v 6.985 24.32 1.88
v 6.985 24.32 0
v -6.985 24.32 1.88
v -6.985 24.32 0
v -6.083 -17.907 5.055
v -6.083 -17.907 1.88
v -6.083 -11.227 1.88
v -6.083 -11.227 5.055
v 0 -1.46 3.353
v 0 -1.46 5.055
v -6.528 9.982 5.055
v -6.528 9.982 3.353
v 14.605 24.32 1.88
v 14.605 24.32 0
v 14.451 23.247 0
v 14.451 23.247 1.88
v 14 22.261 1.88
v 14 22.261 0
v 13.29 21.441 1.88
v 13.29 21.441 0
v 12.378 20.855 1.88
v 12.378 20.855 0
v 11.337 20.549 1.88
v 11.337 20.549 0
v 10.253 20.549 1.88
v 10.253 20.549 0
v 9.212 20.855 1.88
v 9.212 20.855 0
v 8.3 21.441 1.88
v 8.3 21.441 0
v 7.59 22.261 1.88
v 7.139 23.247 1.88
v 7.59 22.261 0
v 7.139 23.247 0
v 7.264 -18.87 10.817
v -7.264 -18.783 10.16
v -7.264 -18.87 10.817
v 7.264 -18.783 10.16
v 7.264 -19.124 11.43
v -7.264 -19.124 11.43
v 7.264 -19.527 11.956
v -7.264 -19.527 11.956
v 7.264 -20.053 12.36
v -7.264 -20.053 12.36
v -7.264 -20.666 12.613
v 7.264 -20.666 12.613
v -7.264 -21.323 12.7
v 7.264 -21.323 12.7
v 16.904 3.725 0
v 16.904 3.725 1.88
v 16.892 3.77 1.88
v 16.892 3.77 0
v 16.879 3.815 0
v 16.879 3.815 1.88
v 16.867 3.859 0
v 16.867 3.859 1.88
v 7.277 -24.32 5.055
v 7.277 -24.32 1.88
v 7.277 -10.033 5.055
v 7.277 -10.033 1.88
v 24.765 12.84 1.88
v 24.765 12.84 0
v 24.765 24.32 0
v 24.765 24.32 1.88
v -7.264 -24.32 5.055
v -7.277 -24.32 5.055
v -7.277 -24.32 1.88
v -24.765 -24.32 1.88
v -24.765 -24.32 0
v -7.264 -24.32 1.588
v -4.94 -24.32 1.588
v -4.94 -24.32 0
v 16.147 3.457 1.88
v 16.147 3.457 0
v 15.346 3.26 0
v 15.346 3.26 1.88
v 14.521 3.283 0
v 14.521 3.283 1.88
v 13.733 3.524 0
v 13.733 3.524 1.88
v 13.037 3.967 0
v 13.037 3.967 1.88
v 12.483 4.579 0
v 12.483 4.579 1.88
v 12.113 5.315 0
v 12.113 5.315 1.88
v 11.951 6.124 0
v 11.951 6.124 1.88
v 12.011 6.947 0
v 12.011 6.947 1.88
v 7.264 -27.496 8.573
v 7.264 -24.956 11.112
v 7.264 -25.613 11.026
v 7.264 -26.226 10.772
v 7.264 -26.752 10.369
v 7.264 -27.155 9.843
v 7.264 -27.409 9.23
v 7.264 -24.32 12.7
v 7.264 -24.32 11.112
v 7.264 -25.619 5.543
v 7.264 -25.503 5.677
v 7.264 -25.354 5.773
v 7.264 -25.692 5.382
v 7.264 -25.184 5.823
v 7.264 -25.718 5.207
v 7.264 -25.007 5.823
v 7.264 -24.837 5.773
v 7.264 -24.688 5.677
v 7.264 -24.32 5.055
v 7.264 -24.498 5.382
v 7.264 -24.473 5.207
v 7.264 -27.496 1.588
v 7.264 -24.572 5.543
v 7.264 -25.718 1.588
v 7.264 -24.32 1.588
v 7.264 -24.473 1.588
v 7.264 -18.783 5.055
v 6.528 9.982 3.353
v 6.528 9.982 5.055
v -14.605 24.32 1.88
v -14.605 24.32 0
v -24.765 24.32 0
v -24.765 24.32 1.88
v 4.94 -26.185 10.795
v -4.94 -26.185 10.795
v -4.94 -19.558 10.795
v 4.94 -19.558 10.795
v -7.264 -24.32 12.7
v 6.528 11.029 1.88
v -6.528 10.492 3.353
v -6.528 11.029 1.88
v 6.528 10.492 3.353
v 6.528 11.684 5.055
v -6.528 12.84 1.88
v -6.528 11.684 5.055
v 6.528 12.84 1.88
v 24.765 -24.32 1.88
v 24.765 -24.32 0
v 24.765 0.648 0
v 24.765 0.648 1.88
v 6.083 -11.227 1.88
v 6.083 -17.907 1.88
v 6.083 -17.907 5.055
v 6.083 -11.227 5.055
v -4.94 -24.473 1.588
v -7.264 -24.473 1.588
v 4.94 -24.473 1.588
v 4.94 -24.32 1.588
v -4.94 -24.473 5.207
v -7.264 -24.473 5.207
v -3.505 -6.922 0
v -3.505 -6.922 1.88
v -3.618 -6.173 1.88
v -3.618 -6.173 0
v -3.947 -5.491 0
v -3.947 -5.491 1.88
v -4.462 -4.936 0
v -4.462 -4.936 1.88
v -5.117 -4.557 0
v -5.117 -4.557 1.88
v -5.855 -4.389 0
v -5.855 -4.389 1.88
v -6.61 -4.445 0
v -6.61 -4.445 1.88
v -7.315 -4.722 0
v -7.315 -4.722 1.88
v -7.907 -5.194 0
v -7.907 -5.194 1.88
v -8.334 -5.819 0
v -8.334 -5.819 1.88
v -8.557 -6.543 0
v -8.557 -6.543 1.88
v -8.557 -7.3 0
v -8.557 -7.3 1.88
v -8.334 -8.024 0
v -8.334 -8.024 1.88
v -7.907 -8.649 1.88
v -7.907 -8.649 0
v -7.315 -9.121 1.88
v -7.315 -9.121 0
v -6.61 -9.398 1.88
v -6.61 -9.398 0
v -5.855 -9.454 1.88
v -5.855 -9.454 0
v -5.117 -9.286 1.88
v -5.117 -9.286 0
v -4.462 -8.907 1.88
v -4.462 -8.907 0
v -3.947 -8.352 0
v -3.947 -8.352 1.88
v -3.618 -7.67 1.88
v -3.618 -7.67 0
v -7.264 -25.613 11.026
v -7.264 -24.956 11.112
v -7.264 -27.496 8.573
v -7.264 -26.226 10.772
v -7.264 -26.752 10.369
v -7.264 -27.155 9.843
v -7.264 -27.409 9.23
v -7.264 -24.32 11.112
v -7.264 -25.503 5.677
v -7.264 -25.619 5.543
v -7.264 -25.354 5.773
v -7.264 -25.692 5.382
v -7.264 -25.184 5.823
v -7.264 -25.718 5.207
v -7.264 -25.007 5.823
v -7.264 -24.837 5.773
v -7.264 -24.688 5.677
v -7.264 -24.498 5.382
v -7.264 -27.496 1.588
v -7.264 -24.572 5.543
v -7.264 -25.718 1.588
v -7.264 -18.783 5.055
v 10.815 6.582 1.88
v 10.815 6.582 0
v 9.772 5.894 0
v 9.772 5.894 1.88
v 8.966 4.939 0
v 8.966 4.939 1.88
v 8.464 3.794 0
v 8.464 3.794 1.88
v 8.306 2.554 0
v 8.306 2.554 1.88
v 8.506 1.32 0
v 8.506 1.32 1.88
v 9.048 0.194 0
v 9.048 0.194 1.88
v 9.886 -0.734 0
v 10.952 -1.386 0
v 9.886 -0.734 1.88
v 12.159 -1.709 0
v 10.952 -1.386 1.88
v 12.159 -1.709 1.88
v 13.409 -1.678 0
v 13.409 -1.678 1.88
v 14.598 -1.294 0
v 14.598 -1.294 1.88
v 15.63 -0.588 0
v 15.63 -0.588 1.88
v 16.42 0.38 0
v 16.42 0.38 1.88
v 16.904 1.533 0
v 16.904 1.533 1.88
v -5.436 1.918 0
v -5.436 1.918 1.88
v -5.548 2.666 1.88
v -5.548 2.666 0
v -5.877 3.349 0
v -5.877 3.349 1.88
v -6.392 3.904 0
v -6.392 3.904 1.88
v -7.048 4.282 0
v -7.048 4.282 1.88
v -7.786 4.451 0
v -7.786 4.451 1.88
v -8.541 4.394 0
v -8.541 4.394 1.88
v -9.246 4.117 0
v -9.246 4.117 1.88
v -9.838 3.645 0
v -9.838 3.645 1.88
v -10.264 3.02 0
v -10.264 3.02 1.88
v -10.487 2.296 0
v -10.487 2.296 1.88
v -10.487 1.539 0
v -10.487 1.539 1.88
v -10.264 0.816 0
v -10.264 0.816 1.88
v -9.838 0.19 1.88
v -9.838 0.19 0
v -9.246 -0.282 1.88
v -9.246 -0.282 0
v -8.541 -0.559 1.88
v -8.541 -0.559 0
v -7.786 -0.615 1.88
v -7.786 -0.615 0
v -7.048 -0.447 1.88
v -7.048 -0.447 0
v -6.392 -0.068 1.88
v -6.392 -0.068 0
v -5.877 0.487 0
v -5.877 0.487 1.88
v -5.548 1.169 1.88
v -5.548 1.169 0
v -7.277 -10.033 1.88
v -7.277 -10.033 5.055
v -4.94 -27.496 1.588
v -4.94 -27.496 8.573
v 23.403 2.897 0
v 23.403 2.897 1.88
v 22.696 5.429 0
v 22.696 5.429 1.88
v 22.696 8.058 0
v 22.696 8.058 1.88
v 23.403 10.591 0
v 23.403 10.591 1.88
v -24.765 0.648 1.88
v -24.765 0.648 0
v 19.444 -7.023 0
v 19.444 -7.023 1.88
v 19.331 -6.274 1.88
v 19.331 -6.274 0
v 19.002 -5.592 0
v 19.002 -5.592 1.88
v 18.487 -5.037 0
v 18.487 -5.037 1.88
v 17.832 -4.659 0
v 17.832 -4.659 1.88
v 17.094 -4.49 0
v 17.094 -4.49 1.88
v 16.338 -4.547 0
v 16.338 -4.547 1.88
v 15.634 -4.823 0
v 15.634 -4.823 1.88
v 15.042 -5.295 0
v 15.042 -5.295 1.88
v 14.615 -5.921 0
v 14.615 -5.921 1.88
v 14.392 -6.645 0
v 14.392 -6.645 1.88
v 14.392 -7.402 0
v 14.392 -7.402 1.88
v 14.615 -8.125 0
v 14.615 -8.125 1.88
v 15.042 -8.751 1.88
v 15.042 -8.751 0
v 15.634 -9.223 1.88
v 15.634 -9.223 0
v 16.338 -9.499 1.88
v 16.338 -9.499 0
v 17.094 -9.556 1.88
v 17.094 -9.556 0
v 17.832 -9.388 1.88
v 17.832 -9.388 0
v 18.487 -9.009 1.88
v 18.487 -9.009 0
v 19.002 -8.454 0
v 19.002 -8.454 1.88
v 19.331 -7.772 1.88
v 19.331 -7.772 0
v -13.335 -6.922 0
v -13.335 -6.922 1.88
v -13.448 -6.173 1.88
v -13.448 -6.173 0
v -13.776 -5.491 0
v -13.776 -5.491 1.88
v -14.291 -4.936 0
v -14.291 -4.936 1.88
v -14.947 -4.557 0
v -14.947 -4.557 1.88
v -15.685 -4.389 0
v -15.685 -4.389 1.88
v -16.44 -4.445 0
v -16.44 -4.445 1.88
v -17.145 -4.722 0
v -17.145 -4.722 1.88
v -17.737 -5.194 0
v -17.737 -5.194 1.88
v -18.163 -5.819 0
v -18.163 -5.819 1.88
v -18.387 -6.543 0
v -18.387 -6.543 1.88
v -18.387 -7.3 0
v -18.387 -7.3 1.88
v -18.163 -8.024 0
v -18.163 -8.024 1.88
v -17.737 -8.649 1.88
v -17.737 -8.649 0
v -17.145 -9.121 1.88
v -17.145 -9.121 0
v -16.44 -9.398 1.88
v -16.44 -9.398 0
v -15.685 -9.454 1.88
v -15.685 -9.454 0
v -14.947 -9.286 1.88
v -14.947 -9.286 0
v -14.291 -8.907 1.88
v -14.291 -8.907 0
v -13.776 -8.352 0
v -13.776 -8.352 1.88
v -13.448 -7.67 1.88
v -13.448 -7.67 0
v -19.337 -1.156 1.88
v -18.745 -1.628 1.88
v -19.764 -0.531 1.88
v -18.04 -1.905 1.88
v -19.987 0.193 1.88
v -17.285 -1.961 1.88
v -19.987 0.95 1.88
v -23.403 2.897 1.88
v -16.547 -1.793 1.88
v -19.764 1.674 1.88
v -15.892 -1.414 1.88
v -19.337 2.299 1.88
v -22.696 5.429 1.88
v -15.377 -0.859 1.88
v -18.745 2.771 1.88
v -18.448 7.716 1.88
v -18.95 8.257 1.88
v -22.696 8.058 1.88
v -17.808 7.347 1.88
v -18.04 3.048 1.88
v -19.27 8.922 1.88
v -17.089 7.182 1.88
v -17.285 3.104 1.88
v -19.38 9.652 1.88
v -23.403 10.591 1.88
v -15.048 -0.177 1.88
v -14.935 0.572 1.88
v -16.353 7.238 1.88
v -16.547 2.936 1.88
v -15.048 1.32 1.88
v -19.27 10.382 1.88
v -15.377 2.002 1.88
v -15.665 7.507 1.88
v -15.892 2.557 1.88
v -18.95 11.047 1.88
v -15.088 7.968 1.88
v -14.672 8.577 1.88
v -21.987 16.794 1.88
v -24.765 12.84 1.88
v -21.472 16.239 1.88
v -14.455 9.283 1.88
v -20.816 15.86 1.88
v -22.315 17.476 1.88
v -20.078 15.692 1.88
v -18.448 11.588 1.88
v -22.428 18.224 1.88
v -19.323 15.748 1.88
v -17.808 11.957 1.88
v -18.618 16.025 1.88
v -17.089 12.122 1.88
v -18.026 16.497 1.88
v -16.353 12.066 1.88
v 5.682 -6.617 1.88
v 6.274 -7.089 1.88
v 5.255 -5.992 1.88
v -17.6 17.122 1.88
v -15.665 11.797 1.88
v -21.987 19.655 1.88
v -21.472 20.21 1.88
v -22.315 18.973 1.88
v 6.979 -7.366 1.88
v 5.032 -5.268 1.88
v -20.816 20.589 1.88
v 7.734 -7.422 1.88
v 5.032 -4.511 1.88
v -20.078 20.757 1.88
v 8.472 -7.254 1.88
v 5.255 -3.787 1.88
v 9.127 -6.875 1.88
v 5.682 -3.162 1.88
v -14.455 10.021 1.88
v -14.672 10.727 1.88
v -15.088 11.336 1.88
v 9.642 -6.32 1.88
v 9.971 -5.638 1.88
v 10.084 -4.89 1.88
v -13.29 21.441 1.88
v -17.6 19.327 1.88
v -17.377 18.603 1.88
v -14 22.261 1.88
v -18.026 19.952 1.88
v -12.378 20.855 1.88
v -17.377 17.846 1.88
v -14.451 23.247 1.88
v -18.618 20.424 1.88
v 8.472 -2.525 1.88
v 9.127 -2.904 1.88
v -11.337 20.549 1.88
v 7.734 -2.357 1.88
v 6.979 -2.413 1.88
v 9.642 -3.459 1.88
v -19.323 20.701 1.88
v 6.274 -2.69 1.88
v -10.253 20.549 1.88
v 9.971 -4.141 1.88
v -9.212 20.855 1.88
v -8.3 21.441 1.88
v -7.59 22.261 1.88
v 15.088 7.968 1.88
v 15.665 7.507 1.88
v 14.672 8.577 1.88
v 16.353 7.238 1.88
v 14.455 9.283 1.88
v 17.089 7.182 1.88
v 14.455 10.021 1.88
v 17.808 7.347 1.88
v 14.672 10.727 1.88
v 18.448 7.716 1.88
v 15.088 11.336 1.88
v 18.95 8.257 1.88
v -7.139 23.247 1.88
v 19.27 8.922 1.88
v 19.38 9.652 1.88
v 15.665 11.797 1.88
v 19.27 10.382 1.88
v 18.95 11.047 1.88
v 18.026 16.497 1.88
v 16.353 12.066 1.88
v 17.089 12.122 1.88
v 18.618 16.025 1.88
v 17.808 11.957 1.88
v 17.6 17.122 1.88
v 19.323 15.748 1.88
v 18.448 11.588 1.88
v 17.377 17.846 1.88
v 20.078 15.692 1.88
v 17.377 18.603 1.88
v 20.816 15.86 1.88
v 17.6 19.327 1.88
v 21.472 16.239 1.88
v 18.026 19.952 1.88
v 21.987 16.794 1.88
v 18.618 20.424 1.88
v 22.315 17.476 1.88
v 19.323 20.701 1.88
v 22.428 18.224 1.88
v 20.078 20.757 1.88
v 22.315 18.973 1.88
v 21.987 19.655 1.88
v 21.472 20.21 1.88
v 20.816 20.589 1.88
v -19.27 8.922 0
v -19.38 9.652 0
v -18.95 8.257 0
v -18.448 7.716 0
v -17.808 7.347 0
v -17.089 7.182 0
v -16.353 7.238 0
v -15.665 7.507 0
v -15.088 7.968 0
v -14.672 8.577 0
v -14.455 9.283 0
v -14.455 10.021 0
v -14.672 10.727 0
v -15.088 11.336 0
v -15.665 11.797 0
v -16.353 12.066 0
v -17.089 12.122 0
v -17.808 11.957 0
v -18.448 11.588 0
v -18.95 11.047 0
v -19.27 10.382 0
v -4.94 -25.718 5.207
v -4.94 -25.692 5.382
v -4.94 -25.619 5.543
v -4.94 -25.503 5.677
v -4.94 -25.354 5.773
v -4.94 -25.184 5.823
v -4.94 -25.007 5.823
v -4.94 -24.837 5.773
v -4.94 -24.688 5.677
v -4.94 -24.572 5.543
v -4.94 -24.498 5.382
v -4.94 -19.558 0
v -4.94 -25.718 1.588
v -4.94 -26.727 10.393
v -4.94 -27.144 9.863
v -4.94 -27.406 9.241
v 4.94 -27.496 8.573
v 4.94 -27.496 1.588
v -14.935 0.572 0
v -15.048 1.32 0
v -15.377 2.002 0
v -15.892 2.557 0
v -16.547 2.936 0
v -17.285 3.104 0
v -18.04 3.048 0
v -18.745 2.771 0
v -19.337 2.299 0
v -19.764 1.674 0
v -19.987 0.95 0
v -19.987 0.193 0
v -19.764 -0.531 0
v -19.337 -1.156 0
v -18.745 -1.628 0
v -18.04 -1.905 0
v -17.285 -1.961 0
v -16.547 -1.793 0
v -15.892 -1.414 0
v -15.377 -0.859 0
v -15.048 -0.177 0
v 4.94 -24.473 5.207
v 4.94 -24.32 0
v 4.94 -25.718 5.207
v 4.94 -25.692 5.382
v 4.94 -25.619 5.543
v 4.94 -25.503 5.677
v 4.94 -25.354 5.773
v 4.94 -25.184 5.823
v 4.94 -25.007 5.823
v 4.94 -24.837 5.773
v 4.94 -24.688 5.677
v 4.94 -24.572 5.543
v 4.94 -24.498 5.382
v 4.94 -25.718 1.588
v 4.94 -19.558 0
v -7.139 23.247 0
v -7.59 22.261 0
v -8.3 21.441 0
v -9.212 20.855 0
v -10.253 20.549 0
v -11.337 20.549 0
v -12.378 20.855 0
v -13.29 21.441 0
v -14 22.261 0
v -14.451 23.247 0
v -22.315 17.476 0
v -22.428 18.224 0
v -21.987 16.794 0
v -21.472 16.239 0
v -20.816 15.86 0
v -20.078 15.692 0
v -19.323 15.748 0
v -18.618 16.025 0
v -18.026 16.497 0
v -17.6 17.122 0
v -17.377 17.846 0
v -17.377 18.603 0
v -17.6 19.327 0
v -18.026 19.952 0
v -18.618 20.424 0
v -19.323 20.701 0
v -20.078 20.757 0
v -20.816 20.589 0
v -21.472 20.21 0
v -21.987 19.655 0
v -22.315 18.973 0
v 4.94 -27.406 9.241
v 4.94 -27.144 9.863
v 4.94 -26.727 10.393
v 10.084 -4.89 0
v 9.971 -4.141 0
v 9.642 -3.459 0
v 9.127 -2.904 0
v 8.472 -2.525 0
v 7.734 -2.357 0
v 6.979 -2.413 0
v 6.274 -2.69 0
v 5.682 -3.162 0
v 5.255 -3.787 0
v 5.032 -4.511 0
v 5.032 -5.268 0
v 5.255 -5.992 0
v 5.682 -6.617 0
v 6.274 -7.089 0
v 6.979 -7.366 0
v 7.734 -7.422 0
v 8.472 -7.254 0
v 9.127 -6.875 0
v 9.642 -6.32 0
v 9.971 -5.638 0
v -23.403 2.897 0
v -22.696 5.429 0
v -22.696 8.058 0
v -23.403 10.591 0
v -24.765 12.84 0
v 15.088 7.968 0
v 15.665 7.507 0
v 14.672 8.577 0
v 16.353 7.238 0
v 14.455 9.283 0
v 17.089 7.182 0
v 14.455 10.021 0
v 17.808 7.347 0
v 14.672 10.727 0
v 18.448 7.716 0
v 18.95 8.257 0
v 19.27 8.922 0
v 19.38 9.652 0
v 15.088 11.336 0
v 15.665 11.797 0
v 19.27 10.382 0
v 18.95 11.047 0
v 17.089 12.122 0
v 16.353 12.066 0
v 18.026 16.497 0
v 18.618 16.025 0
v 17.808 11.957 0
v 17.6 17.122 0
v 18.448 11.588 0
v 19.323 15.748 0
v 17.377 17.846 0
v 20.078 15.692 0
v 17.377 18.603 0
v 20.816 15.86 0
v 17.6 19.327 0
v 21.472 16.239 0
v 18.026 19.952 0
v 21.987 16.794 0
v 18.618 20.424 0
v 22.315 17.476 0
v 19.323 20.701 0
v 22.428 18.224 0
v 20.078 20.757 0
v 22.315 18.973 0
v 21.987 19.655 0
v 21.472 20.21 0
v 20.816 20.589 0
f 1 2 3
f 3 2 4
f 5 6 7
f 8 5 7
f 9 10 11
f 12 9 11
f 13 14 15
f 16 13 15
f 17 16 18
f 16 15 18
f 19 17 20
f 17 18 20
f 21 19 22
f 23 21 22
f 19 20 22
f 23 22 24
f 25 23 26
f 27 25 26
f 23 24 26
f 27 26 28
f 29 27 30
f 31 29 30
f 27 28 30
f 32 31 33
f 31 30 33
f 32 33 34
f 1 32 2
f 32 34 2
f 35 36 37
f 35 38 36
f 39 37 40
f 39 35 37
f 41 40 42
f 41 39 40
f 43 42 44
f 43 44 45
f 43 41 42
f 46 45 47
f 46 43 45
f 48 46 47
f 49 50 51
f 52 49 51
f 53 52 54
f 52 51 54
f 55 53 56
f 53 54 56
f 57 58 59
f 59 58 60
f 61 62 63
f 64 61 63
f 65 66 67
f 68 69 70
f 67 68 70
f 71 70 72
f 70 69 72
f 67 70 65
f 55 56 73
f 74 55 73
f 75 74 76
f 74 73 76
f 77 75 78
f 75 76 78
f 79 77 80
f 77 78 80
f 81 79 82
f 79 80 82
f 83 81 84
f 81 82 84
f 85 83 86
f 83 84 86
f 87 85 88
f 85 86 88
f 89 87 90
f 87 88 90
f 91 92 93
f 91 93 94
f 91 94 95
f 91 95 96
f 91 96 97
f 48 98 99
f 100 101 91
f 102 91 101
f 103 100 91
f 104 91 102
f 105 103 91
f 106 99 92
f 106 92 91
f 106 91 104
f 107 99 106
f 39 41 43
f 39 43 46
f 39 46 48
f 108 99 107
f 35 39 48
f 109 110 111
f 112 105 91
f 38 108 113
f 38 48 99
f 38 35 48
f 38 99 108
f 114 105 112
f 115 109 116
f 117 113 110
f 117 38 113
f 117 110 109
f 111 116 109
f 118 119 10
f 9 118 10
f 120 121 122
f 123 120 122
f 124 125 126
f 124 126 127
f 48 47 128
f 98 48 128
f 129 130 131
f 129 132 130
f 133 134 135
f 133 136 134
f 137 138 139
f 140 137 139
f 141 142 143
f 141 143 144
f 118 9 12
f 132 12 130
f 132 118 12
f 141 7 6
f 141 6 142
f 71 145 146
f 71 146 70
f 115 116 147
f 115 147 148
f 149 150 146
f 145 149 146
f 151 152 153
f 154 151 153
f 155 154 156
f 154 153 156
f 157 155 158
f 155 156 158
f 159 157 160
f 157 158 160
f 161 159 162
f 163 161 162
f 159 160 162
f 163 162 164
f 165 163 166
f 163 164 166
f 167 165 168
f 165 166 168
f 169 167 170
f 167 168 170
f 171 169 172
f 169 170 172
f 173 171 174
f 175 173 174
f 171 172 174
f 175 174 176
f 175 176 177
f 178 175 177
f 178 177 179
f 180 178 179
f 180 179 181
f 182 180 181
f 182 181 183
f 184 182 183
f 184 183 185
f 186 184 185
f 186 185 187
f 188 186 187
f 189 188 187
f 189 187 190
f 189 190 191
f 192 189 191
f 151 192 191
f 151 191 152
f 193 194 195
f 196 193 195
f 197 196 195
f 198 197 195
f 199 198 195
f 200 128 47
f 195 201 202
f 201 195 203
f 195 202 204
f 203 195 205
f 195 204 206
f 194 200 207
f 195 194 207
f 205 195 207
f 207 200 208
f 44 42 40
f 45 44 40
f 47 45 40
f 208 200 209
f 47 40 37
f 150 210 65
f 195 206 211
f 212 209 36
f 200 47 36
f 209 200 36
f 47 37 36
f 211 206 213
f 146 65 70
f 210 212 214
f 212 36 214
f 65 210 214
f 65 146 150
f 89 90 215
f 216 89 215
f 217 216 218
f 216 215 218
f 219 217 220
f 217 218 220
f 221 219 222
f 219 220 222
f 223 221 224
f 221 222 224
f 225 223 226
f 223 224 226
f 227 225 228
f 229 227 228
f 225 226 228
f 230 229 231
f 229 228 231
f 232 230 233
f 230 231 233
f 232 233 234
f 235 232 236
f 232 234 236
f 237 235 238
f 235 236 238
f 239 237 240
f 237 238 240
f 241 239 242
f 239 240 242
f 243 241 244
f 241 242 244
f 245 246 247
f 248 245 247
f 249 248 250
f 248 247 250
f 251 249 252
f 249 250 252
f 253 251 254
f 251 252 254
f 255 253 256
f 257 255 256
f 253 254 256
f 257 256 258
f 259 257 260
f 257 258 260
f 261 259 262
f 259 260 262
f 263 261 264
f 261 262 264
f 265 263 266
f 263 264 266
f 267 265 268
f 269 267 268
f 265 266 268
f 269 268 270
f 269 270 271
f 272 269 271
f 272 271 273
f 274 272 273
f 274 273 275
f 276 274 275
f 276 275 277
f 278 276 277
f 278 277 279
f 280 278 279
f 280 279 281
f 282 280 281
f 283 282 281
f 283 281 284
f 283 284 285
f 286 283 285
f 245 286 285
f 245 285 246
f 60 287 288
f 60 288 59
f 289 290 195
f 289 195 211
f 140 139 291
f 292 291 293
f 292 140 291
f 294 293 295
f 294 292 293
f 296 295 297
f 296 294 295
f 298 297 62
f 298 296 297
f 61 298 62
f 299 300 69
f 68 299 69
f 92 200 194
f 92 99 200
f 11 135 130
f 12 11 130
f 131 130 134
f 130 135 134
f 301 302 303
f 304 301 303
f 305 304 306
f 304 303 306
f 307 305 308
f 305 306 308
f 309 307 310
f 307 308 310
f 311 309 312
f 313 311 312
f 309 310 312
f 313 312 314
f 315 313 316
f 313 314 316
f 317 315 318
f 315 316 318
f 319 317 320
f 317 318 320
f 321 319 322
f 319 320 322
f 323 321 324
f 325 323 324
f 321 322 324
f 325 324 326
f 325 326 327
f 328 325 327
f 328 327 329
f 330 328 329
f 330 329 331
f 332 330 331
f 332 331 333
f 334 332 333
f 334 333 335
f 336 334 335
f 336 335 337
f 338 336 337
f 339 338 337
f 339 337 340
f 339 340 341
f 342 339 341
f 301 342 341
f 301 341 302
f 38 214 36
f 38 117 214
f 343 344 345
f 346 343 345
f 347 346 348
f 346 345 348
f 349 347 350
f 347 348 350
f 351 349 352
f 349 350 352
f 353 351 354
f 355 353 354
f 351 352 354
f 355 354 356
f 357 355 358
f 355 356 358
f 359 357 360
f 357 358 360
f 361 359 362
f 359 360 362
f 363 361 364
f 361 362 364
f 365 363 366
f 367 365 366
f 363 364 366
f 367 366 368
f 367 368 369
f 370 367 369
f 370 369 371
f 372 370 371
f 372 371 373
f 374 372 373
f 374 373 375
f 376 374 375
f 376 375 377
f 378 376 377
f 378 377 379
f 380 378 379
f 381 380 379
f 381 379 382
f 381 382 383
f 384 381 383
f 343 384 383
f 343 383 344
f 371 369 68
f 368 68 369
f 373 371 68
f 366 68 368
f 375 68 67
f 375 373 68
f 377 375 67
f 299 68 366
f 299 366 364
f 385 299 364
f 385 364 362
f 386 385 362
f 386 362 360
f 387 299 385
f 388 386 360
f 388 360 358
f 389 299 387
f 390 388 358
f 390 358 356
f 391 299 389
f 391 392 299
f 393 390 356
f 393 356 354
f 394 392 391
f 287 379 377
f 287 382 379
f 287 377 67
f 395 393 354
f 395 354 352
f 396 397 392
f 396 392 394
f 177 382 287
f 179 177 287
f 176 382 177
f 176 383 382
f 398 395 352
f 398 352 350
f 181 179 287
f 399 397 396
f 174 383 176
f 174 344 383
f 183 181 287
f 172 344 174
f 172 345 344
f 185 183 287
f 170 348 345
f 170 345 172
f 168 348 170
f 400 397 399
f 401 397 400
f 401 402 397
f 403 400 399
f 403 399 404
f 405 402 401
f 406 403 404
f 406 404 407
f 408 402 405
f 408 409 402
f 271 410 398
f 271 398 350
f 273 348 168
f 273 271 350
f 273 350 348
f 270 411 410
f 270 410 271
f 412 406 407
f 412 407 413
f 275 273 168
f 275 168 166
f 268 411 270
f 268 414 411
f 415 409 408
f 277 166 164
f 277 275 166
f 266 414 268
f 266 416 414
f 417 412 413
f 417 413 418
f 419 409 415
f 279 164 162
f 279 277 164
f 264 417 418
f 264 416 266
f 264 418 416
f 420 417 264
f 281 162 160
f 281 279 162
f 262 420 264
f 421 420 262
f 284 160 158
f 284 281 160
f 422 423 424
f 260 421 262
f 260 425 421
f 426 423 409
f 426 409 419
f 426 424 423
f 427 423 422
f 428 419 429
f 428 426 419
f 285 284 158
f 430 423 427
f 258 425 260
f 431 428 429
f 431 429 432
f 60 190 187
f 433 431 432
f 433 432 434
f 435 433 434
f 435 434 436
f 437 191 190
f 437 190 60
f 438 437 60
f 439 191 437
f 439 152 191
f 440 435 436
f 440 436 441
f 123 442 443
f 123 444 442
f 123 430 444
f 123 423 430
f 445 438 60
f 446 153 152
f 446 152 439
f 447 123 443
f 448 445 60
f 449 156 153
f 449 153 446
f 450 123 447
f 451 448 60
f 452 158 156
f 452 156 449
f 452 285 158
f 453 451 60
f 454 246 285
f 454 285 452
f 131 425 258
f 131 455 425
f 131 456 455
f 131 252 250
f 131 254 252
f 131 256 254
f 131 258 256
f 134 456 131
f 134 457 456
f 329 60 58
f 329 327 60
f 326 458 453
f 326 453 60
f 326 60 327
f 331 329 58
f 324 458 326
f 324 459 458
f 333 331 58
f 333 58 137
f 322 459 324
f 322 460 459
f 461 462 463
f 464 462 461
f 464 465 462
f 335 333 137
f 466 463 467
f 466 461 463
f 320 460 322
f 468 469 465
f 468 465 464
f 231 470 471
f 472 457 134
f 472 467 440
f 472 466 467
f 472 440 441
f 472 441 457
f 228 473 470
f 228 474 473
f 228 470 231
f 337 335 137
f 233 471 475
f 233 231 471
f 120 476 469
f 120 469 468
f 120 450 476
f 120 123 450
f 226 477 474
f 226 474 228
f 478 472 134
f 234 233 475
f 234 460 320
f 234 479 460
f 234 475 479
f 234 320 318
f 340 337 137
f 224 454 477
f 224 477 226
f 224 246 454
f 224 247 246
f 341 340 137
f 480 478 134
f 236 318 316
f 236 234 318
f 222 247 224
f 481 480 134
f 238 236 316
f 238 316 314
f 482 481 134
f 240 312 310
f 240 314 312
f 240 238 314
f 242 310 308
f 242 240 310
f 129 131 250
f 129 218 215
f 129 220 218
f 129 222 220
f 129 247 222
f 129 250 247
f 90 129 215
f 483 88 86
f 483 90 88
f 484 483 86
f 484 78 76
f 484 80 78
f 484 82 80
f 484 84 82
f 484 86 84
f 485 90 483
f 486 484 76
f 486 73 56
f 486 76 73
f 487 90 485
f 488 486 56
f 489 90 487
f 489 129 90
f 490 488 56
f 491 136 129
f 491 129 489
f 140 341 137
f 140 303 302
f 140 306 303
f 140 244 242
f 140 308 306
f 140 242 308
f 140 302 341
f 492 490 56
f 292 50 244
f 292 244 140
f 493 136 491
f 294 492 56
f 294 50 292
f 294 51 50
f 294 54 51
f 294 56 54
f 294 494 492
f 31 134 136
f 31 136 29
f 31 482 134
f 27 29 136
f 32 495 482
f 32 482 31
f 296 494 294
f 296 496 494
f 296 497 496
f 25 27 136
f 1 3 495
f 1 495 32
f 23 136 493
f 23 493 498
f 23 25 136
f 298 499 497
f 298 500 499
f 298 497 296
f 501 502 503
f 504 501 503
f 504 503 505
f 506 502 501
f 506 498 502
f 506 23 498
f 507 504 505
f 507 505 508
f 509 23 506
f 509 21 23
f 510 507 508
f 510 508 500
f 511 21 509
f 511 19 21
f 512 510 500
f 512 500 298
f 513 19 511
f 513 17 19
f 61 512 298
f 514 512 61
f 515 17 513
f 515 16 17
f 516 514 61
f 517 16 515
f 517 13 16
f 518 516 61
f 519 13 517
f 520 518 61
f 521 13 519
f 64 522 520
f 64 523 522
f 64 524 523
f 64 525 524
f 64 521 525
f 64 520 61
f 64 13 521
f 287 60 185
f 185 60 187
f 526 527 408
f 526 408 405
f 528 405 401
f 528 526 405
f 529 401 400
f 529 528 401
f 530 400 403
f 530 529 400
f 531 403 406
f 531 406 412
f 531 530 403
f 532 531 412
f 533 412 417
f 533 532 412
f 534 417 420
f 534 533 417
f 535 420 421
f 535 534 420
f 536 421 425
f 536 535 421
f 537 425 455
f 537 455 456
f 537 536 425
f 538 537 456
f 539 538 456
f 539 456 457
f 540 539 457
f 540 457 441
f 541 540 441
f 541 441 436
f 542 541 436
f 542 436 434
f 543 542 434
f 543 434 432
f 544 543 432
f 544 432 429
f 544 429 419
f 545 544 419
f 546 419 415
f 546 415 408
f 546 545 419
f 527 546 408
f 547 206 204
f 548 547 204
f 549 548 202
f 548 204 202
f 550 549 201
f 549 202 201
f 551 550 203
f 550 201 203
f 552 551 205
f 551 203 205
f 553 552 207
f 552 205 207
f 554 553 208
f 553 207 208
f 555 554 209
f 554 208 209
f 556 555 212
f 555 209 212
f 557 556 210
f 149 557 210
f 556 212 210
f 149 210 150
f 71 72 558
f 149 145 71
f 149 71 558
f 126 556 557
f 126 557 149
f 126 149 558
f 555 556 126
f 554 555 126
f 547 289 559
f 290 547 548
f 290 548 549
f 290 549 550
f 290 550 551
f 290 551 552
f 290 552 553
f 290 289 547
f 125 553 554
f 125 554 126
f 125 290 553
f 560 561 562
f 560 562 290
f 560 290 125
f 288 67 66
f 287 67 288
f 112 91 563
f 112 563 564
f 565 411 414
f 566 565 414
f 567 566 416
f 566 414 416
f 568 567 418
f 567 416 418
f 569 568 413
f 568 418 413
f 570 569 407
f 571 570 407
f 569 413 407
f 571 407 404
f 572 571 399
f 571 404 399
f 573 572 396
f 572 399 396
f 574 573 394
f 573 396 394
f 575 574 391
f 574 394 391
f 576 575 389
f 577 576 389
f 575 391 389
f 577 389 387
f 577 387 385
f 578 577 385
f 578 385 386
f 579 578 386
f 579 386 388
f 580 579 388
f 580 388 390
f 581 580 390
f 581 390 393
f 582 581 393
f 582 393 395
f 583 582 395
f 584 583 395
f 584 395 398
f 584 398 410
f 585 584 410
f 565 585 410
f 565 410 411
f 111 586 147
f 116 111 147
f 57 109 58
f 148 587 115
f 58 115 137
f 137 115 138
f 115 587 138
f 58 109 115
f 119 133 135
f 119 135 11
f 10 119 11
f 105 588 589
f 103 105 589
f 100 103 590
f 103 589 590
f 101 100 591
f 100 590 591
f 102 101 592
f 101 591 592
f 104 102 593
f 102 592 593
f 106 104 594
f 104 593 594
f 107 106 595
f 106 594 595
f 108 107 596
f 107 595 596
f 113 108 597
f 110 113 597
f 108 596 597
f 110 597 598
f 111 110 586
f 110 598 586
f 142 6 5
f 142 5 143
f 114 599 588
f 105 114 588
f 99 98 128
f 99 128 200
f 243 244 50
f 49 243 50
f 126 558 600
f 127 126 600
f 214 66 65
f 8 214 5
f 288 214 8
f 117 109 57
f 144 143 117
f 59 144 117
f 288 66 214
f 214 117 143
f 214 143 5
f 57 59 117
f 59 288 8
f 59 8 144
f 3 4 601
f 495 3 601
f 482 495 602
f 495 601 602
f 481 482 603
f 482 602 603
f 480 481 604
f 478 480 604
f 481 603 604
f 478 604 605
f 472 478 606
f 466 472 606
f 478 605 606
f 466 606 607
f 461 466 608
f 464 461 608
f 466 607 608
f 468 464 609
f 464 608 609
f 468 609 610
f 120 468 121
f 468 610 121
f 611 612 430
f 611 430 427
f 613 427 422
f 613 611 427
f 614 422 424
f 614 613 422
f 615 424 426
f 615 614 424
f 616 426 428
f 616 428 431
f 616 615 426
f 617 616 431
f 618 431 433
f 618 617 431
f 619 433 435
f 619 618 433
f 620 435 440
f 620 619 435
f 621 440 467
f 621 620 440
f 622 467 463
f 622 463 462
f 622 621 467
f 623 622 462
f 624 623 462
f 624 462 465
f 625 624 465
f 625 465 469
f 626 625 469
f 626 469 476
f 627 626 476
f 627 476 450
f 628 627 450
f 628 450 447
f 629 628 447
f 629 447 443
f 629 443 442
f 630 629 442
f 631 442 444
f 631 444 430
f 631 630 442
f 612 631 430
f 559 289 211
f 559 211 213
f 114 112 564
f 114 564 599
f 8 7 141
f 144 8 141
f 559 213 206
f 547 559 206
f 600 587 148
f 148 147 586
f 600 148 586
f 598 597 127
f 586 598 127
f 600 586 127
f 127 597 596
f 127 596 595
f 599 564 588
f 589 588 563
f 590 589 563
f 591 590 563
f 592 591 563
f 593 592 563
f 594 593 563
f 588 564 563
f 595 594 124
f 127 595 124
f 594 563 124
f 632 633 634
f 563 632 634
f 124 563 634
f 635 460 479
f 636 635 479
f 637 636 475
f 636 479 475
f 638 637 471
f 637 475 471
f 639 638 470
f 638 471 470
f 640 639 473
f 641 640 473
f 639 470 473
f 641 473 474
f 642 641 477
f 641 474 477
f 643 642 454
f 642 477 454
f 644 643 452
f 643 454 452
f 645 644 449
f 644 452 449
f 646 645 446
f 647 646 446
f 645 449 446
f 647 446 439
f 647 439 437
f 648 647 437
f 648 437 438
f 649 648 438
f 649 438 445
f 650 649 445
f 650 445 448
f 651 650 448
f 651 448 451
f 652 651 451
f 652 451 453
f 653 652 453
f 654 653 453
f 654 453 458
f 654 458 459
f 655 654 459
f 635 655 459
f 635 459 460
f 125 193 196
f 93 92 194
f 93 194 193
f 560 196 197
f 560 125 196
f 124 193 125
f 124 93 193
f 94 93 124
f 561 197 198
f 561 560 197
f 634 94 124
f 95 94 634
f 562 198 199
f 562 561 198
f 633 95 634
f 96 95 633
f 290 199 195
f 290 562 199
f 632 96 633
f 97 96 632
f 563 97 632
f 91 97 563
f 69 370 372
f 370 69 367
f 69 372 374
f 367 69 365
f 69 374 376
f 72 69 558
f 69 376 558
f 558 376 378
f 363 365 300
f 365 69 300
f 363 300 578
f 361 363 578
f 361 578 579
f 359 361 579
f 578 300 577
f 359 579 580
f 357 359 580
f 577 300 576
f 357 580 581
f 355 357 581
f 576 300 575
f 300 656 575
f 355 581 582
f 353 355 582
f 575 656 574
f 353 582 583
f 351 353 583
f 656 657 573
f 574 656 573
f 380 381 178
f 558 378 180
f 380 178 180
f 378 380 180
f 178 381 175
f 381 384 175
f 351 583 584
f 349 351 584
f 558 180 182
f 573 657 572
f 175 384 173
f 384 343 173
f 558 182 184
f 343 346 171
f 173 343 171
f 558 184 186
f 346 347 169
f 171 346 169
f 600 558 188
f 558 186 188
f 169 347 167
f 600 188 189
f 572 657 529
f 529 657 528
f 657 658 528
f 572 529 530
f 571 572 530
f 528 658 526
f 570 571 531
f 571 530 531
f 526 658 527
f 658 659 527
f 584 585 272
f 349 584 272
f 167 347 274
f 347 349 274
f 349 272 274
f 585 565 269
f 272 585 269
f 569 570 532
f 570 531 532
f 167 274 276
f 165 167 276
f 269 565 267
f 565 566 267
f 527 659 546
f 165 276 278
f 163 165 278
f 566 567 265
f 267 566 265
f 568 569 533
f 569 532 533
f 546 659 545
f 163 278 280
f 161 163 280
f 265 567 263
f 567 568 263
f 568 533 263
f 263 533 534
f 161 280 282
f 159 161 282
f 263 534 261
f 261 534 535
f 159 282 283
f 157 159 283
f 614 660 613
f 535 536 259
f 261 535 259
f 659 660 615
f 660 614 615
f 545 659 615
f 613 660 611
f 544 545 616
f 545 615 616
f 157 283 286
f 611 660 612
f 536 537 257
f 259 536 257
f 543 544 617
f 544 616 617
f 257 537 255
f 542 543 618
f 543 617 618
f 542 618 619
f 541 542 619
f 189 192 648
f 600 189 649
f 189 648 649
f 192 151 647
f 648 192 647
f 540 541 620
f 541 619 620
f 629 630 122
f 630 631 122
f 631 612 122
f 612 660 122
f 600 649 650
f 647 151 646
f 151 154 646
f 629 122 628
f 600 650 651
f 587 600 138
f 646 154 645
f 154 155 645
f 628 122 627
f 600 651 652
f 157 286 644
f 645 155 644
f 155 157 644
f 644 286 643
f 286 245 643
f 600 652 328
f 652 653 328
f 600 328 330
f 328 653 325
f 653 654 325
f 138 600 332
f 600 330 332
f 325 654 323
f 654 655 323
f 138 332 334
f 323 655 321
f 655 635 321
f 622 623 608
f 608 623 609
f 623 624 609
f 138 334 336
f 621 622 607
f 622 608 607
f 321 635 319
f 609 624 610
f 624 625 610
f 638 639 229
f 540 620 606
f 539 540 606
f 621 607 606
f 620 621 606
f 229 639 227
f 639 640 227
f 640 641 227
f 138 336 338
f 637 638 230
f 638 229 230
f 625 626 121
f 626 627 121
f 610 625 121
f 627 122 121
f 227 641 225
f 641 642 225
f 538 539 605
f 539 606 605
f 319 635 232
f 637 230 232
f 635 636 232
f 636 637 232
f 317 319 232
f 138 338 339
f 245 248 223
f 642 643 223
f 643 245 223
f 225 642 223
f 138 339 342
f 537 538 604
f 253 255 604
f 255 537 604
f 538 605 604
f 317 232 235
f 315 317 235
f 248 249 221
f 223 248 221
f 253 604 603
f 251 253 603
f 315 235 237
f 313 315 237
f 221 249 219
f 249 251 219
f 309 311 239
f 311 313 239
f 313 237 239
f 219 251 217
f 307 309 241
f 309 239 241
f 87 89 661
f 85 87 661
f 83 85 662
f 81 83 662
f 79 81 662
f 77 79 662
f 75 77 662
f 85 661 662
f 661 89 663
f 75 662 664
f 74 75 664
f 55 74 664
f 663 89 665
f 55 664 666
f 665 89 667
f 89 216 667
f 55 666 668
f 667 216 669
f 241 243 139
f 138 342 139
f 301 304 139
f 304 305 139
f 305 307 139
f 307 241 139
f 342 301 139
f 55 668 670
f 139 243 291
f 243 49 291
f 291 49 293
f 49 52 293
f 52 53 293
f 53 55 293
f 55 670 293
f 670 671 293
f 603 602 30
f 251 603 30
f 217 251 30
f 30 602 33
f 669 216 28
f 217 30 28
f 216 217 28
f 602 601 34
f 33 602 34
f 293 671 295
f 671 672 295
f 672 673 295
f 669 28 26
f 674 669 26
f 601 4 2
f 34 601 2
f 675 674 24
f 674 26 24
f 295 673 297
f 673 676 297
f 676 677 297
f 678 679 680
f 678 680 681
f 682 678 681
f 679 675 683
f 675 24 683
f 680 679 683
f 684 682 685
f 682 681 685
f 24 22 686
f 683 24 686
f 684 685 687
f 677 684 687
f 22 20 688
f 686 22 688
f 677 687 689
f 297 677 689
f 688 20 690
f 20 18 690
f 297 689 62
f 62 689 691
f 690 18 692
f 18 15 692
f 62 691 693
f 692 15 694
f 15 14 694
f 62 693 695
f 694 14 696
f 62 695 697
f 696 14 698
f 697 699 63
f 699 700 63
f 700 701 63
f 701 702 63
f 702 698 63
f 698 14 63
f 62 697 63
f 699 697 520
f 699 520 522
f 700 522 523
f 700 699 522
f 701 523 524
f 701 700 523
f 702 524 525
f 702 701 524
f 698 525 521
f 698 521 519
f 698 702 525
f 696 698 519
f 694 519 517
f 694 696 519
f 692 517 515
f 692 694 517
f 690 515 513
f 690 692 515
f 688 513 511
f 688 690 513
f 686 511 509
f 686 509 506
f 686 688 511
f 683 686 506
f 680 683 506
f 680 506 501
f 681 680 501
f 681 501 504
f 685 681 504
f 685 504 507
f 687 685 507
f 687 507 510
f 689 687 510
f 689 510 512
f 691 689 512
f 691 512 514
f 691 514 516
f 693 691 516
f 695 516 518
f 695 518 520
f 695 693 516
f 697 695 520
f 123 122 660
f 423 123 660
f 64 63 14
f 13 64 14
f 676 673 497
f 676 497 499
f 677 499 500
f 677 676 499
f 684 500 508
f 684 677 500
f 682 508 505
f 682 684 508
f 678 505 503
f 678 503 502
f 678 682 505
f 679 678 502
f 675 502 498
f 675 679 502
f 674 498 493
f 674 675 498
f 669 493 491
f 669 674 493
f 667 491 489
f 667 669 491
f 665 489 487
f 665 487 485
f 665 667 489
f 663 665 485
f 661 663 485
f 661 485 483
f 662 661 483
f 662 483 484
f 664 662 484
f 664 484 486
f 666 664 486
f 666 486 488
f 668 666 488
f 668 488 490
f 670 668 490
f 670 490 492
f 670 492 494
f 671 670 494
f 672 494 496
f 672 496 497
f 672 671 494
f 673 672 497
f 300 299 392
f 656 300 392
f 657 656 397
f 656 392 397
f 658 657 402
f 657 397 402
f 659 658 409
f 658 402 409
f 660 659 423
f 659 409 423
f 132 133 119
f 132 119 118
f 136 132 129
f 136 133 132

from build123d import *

# Parameters (mm, degrees)
SKETCH1_R           = 2.54
SKETCH1_R_2         = 2.4765
BOSS_EXTRUDE1_DEPTH = 1.8796
SKETCH2_R           = 2.54
CUT_EXTRUDE1_DEPTH  = 35.760967211
CUT_EXTRUDE2_DEPTH  = 35.760967211
BOSS_EXTRUDE2_DEPTH = 6.5278
CUT_EXTRUDE4_REACH  = 37.076
SKETCH6_W           = 14.5542
SKETCH6_H           = 14.2875
SKETCH6_W_2         = 12.1666
SKETCH6_H_2         = 6.6802
BOSS_EXTRUDE3_DEPTH = 3.175
BOSS_EXTRUDE4_DEPTH = 7.2644
FILLET1_R           = 2.54
SKETCH8_W           = 9.8806
SKETCH8_H           = 10.795
CUT_EXTRUDE5_DEPTH  = 7.9375
CUT_EXTRUDE6_DEPTH  = 45.081458513


with BuildPart() as part:
    # Sketch1 → Boss-Extrude1 (new body)
    with BuildSketch(Plane.XY):
        with BuildLine():
            Line((-24.765, -24.3205), (24.765, -24.3205))
            Line((24.765, -24.3205), (24.765, 24.3205))
            Line((24.765, 24.3205), (14.605, 24.3205))
            ThreePointArc((14.605, 24.3205), (10.795, 20.5105), (6.985, 24.3205))
            Line((6.985, 24.3205), (-6.985, 24.3205))
            ThreePointArc((-6.985, 24.3205), (-10.795, 20.5105), (-14.605, 24.3205))
            Line((-14.605, 24.3205), (-24.765, 24.3205))
            Line((-24.765, 24.3205), (-24.765, -24.3205))
        make_face()
        with Locations((19.8882, 18.2245)):
            Circle(SKETCH1_R, mode=Mode.SUBTRACT)
        with Locations((16.9037, 9.652)):
            Circle(SKETCH1_R_2, mode=Mode.SUBTRACT)
        with Locations(Location((-16.9037, 9.652, 0), (0, 0, 180))):
            Circle(SKETCH1_R_2, mode=Mode.SUBTRACT)
        with Locations(Location((-19.8882, 18.2245, 0), (0, 0, 180))):
            Circle(SKETCH1_R, mode=Mode.SUBTRACT)
    extrude(amount=BOSS_EXTRUDE1_DEPTH)

    # Sketch2 → Cut-Extrude1 (cut, through all)
    with BuildSketch(Plane.XY.offset(1.8796)):
        with Locations((16.9037, -7.0231)):
            Circle(SKETCH2_R)
        with BuildLine():
            Line((16.9037, 1.532940772), (16.9037, 3.724859228))
            ThreePointArc((16.9037, 3.724859228), (16.885643629, 3.792310932), (16.866511516, 3.859465433))
            ThreePointArc((16.866511516, 3.859465433), (13.369701525, 3.722012542), (12.011049817, 6.947014704))
            ThreePointArc((12.011049817, 6.947014704), (9.433252208, -0.300277005), (16.9037, 1.532940772))
        make_face()
        with Locations((-7.9756, 1.9177)):
            Circle(SKETCH2_R)
        with Locations((-17.4752, 0.5715)):
            Circle(SKETCH2_R)
        with Locations((-6.0452, -6.9215)):
            Circle(SKETCH2_R)
        with Locations((-15.875, -6.9215)):
            Circle(SKETCH2_R)
        with Locations((7.5438, -4.8895)):
            Circle(SKETCH2_R)
    extrude(amount=-CUT_EXTRUDE1_DEPTH, mode=Mode.SUBTRACT)

    # Sketch3 → Cut-Extrude2 (cut, through all)
    with BuildSketch(Plane.XY.offset(1.8796)):
        with BuildLine():
            Line((24.765, 12.8397), (24.765, 0.6477))
            ThreePointArc((24.765, 0.6477), (22.606, 6.7437), (24.765, 12.8397))
        make_face()
    cut_extrude2 = extrude(amount=-CUT_EXTRUDE2_DEPTH, mode=Mode.SUBTRACT)

    # Mirror1: Cut-Extrude2 across plane
    add(cut_extrude2.mirror(Plane(origin=(0, 0, 0), x_dir=(0, 0, 1), z_dir=(1, 0, 0))), mode=Mode.SUBTRACT)

    # Sketch4 → Boss-Extrude2 (add, symmetric)
    with BuildSketch(Plane(origin=(0, 0, 0), x_dir=(0, 0, -1), z_dir=(1, 0, 0))):
        Polygon((-1.8796, 12.8397), (-5.0546, 11.684094506), (-5.0546, -1.4605), (-3.3528, -1.4605), (-3.3528, 10.492481318), (-1.8796, 11.028682267), align=None)
    extrude(amount=BOSS_EXTRUDE2_DEPTH, both=True)

    # Sketch5 → Cut-Extrude4 (cut, up to next)
    with BuildSketch(Plane.XY.offset(5.0546), mode=Mode.PRIVATE) as cut_extrude4_sk1:
        Polygon((-6.5278, -1.4605), (0, -1.4605), (-6.5278, 9.982294506), align=None)
    cut_extrude4_tool1 = extrude(cut_extrude4_sk1.sketch, amount=-CUT_EXTRUDE4_REACH, mode=Mode.PRIVATE) & part.part
    # Sketch5 → Cut-Extrude4 (cut, up to next)
    with BuildSketch(Plane.XY.offset(5.0546), mode=Mode.PRIVATE) as cut_extrude4_sk2:
        Polygon((6.5278, 9.982294506), (0, -1.4605), (6.5278, -1.4605), align=None)
    cut_extrude4_tool2 = extrude(cut_extrude4_sk2.sketch, amount=-CUT_EXTRUDE4_REACH, mode=Mode.PRIVATE) & part.part
    add(cut_extrude4_tool1.solids().sort_by_distance((-4.351867, 2.353765, 5.0546))[0], mode=Mode.SUBTRACT)
    add(cut_extrude4_tool2.solids().sort_by_distance((4.351867, 2.353765, 5.0546))[0], mode=Mode.SUBTRACT)

    # Sketch6 → Boss-Extrude3 (add)
    with BuildSketch(Plane.XY.offset(1.8796)):
        with Locations((0, -17.17675)):
            Rectangle(SKETCH6_W, SKETCH6_H)
        with Locations((0, -14.5669)):
            Rectangle(SKETCH6_W_2, SKETCH6_H_2, mode=Mode.SUBTRACT)
    extrude(amount=BOSS_EXTRUDE3_DEPTH)

    # Sketch7 → Boss-Extrude4 (add, symmetric)
    with BuildSketch(Plane(origin=(0, 0, 0), x_dir=(0, 0, -1), z_dir=(1, 0, 0))):
        Polygon((-5.0546, -18.7833), (-12.7, -18.7833), (-12.7, -24.3205), (-11.1125, -24.3205), (-11.1125, -27.4955), (-1.5875, -27.4955), (-1.5875, -24.3205), (-5.0546, -24.3205), align=None)
    extrude(amount=BOSS_EXTRUDE4_DEPTH, both=True)

    # Fillet1
    fillet1_edges = [part.edges().sort_by_distance(p)[0] for p in [
        (0, -18.7833, 12.7),
        (0, -27.4955, 11.1125),
    ]]
    fillet(fillet1_edges, radius=FILLET1_R)

    # Sketch8 → Cut-Extrude5 (cut)
    with BuildSketch(Plane.XZ.offset(27.4955)):
        with Locations((0, 5.3975)):
            Rectangle(SKETCH8_W, SKETCH8_H)
    extrude(amount=-CUT_EXTRUDE5_DEPTH, mode=Mode.SUBTRACT)

    # Sketch9 → Cut-Extrude6 (cut, through all)
    with BuildSketch(Plane.ZY.offset(7.2644)):
        with BuildLine():
            Line((5.207, -24.4729), (1.5875, -24.4729))
            Line((1.5875, -24.4729), (1.5875, -25.7175))
            Line((1.5875, -25.7175), (5.207, -25.7175))
            ThreePointArc((5.207, -25.7175), (5.8293, -25.0952), (5.207, -24.4729))
        make_face()
    extrude(amount=-CUT_EXTRUDE6_DEPTH, mode=Mode.SUBTRACT)


solid = part.part
